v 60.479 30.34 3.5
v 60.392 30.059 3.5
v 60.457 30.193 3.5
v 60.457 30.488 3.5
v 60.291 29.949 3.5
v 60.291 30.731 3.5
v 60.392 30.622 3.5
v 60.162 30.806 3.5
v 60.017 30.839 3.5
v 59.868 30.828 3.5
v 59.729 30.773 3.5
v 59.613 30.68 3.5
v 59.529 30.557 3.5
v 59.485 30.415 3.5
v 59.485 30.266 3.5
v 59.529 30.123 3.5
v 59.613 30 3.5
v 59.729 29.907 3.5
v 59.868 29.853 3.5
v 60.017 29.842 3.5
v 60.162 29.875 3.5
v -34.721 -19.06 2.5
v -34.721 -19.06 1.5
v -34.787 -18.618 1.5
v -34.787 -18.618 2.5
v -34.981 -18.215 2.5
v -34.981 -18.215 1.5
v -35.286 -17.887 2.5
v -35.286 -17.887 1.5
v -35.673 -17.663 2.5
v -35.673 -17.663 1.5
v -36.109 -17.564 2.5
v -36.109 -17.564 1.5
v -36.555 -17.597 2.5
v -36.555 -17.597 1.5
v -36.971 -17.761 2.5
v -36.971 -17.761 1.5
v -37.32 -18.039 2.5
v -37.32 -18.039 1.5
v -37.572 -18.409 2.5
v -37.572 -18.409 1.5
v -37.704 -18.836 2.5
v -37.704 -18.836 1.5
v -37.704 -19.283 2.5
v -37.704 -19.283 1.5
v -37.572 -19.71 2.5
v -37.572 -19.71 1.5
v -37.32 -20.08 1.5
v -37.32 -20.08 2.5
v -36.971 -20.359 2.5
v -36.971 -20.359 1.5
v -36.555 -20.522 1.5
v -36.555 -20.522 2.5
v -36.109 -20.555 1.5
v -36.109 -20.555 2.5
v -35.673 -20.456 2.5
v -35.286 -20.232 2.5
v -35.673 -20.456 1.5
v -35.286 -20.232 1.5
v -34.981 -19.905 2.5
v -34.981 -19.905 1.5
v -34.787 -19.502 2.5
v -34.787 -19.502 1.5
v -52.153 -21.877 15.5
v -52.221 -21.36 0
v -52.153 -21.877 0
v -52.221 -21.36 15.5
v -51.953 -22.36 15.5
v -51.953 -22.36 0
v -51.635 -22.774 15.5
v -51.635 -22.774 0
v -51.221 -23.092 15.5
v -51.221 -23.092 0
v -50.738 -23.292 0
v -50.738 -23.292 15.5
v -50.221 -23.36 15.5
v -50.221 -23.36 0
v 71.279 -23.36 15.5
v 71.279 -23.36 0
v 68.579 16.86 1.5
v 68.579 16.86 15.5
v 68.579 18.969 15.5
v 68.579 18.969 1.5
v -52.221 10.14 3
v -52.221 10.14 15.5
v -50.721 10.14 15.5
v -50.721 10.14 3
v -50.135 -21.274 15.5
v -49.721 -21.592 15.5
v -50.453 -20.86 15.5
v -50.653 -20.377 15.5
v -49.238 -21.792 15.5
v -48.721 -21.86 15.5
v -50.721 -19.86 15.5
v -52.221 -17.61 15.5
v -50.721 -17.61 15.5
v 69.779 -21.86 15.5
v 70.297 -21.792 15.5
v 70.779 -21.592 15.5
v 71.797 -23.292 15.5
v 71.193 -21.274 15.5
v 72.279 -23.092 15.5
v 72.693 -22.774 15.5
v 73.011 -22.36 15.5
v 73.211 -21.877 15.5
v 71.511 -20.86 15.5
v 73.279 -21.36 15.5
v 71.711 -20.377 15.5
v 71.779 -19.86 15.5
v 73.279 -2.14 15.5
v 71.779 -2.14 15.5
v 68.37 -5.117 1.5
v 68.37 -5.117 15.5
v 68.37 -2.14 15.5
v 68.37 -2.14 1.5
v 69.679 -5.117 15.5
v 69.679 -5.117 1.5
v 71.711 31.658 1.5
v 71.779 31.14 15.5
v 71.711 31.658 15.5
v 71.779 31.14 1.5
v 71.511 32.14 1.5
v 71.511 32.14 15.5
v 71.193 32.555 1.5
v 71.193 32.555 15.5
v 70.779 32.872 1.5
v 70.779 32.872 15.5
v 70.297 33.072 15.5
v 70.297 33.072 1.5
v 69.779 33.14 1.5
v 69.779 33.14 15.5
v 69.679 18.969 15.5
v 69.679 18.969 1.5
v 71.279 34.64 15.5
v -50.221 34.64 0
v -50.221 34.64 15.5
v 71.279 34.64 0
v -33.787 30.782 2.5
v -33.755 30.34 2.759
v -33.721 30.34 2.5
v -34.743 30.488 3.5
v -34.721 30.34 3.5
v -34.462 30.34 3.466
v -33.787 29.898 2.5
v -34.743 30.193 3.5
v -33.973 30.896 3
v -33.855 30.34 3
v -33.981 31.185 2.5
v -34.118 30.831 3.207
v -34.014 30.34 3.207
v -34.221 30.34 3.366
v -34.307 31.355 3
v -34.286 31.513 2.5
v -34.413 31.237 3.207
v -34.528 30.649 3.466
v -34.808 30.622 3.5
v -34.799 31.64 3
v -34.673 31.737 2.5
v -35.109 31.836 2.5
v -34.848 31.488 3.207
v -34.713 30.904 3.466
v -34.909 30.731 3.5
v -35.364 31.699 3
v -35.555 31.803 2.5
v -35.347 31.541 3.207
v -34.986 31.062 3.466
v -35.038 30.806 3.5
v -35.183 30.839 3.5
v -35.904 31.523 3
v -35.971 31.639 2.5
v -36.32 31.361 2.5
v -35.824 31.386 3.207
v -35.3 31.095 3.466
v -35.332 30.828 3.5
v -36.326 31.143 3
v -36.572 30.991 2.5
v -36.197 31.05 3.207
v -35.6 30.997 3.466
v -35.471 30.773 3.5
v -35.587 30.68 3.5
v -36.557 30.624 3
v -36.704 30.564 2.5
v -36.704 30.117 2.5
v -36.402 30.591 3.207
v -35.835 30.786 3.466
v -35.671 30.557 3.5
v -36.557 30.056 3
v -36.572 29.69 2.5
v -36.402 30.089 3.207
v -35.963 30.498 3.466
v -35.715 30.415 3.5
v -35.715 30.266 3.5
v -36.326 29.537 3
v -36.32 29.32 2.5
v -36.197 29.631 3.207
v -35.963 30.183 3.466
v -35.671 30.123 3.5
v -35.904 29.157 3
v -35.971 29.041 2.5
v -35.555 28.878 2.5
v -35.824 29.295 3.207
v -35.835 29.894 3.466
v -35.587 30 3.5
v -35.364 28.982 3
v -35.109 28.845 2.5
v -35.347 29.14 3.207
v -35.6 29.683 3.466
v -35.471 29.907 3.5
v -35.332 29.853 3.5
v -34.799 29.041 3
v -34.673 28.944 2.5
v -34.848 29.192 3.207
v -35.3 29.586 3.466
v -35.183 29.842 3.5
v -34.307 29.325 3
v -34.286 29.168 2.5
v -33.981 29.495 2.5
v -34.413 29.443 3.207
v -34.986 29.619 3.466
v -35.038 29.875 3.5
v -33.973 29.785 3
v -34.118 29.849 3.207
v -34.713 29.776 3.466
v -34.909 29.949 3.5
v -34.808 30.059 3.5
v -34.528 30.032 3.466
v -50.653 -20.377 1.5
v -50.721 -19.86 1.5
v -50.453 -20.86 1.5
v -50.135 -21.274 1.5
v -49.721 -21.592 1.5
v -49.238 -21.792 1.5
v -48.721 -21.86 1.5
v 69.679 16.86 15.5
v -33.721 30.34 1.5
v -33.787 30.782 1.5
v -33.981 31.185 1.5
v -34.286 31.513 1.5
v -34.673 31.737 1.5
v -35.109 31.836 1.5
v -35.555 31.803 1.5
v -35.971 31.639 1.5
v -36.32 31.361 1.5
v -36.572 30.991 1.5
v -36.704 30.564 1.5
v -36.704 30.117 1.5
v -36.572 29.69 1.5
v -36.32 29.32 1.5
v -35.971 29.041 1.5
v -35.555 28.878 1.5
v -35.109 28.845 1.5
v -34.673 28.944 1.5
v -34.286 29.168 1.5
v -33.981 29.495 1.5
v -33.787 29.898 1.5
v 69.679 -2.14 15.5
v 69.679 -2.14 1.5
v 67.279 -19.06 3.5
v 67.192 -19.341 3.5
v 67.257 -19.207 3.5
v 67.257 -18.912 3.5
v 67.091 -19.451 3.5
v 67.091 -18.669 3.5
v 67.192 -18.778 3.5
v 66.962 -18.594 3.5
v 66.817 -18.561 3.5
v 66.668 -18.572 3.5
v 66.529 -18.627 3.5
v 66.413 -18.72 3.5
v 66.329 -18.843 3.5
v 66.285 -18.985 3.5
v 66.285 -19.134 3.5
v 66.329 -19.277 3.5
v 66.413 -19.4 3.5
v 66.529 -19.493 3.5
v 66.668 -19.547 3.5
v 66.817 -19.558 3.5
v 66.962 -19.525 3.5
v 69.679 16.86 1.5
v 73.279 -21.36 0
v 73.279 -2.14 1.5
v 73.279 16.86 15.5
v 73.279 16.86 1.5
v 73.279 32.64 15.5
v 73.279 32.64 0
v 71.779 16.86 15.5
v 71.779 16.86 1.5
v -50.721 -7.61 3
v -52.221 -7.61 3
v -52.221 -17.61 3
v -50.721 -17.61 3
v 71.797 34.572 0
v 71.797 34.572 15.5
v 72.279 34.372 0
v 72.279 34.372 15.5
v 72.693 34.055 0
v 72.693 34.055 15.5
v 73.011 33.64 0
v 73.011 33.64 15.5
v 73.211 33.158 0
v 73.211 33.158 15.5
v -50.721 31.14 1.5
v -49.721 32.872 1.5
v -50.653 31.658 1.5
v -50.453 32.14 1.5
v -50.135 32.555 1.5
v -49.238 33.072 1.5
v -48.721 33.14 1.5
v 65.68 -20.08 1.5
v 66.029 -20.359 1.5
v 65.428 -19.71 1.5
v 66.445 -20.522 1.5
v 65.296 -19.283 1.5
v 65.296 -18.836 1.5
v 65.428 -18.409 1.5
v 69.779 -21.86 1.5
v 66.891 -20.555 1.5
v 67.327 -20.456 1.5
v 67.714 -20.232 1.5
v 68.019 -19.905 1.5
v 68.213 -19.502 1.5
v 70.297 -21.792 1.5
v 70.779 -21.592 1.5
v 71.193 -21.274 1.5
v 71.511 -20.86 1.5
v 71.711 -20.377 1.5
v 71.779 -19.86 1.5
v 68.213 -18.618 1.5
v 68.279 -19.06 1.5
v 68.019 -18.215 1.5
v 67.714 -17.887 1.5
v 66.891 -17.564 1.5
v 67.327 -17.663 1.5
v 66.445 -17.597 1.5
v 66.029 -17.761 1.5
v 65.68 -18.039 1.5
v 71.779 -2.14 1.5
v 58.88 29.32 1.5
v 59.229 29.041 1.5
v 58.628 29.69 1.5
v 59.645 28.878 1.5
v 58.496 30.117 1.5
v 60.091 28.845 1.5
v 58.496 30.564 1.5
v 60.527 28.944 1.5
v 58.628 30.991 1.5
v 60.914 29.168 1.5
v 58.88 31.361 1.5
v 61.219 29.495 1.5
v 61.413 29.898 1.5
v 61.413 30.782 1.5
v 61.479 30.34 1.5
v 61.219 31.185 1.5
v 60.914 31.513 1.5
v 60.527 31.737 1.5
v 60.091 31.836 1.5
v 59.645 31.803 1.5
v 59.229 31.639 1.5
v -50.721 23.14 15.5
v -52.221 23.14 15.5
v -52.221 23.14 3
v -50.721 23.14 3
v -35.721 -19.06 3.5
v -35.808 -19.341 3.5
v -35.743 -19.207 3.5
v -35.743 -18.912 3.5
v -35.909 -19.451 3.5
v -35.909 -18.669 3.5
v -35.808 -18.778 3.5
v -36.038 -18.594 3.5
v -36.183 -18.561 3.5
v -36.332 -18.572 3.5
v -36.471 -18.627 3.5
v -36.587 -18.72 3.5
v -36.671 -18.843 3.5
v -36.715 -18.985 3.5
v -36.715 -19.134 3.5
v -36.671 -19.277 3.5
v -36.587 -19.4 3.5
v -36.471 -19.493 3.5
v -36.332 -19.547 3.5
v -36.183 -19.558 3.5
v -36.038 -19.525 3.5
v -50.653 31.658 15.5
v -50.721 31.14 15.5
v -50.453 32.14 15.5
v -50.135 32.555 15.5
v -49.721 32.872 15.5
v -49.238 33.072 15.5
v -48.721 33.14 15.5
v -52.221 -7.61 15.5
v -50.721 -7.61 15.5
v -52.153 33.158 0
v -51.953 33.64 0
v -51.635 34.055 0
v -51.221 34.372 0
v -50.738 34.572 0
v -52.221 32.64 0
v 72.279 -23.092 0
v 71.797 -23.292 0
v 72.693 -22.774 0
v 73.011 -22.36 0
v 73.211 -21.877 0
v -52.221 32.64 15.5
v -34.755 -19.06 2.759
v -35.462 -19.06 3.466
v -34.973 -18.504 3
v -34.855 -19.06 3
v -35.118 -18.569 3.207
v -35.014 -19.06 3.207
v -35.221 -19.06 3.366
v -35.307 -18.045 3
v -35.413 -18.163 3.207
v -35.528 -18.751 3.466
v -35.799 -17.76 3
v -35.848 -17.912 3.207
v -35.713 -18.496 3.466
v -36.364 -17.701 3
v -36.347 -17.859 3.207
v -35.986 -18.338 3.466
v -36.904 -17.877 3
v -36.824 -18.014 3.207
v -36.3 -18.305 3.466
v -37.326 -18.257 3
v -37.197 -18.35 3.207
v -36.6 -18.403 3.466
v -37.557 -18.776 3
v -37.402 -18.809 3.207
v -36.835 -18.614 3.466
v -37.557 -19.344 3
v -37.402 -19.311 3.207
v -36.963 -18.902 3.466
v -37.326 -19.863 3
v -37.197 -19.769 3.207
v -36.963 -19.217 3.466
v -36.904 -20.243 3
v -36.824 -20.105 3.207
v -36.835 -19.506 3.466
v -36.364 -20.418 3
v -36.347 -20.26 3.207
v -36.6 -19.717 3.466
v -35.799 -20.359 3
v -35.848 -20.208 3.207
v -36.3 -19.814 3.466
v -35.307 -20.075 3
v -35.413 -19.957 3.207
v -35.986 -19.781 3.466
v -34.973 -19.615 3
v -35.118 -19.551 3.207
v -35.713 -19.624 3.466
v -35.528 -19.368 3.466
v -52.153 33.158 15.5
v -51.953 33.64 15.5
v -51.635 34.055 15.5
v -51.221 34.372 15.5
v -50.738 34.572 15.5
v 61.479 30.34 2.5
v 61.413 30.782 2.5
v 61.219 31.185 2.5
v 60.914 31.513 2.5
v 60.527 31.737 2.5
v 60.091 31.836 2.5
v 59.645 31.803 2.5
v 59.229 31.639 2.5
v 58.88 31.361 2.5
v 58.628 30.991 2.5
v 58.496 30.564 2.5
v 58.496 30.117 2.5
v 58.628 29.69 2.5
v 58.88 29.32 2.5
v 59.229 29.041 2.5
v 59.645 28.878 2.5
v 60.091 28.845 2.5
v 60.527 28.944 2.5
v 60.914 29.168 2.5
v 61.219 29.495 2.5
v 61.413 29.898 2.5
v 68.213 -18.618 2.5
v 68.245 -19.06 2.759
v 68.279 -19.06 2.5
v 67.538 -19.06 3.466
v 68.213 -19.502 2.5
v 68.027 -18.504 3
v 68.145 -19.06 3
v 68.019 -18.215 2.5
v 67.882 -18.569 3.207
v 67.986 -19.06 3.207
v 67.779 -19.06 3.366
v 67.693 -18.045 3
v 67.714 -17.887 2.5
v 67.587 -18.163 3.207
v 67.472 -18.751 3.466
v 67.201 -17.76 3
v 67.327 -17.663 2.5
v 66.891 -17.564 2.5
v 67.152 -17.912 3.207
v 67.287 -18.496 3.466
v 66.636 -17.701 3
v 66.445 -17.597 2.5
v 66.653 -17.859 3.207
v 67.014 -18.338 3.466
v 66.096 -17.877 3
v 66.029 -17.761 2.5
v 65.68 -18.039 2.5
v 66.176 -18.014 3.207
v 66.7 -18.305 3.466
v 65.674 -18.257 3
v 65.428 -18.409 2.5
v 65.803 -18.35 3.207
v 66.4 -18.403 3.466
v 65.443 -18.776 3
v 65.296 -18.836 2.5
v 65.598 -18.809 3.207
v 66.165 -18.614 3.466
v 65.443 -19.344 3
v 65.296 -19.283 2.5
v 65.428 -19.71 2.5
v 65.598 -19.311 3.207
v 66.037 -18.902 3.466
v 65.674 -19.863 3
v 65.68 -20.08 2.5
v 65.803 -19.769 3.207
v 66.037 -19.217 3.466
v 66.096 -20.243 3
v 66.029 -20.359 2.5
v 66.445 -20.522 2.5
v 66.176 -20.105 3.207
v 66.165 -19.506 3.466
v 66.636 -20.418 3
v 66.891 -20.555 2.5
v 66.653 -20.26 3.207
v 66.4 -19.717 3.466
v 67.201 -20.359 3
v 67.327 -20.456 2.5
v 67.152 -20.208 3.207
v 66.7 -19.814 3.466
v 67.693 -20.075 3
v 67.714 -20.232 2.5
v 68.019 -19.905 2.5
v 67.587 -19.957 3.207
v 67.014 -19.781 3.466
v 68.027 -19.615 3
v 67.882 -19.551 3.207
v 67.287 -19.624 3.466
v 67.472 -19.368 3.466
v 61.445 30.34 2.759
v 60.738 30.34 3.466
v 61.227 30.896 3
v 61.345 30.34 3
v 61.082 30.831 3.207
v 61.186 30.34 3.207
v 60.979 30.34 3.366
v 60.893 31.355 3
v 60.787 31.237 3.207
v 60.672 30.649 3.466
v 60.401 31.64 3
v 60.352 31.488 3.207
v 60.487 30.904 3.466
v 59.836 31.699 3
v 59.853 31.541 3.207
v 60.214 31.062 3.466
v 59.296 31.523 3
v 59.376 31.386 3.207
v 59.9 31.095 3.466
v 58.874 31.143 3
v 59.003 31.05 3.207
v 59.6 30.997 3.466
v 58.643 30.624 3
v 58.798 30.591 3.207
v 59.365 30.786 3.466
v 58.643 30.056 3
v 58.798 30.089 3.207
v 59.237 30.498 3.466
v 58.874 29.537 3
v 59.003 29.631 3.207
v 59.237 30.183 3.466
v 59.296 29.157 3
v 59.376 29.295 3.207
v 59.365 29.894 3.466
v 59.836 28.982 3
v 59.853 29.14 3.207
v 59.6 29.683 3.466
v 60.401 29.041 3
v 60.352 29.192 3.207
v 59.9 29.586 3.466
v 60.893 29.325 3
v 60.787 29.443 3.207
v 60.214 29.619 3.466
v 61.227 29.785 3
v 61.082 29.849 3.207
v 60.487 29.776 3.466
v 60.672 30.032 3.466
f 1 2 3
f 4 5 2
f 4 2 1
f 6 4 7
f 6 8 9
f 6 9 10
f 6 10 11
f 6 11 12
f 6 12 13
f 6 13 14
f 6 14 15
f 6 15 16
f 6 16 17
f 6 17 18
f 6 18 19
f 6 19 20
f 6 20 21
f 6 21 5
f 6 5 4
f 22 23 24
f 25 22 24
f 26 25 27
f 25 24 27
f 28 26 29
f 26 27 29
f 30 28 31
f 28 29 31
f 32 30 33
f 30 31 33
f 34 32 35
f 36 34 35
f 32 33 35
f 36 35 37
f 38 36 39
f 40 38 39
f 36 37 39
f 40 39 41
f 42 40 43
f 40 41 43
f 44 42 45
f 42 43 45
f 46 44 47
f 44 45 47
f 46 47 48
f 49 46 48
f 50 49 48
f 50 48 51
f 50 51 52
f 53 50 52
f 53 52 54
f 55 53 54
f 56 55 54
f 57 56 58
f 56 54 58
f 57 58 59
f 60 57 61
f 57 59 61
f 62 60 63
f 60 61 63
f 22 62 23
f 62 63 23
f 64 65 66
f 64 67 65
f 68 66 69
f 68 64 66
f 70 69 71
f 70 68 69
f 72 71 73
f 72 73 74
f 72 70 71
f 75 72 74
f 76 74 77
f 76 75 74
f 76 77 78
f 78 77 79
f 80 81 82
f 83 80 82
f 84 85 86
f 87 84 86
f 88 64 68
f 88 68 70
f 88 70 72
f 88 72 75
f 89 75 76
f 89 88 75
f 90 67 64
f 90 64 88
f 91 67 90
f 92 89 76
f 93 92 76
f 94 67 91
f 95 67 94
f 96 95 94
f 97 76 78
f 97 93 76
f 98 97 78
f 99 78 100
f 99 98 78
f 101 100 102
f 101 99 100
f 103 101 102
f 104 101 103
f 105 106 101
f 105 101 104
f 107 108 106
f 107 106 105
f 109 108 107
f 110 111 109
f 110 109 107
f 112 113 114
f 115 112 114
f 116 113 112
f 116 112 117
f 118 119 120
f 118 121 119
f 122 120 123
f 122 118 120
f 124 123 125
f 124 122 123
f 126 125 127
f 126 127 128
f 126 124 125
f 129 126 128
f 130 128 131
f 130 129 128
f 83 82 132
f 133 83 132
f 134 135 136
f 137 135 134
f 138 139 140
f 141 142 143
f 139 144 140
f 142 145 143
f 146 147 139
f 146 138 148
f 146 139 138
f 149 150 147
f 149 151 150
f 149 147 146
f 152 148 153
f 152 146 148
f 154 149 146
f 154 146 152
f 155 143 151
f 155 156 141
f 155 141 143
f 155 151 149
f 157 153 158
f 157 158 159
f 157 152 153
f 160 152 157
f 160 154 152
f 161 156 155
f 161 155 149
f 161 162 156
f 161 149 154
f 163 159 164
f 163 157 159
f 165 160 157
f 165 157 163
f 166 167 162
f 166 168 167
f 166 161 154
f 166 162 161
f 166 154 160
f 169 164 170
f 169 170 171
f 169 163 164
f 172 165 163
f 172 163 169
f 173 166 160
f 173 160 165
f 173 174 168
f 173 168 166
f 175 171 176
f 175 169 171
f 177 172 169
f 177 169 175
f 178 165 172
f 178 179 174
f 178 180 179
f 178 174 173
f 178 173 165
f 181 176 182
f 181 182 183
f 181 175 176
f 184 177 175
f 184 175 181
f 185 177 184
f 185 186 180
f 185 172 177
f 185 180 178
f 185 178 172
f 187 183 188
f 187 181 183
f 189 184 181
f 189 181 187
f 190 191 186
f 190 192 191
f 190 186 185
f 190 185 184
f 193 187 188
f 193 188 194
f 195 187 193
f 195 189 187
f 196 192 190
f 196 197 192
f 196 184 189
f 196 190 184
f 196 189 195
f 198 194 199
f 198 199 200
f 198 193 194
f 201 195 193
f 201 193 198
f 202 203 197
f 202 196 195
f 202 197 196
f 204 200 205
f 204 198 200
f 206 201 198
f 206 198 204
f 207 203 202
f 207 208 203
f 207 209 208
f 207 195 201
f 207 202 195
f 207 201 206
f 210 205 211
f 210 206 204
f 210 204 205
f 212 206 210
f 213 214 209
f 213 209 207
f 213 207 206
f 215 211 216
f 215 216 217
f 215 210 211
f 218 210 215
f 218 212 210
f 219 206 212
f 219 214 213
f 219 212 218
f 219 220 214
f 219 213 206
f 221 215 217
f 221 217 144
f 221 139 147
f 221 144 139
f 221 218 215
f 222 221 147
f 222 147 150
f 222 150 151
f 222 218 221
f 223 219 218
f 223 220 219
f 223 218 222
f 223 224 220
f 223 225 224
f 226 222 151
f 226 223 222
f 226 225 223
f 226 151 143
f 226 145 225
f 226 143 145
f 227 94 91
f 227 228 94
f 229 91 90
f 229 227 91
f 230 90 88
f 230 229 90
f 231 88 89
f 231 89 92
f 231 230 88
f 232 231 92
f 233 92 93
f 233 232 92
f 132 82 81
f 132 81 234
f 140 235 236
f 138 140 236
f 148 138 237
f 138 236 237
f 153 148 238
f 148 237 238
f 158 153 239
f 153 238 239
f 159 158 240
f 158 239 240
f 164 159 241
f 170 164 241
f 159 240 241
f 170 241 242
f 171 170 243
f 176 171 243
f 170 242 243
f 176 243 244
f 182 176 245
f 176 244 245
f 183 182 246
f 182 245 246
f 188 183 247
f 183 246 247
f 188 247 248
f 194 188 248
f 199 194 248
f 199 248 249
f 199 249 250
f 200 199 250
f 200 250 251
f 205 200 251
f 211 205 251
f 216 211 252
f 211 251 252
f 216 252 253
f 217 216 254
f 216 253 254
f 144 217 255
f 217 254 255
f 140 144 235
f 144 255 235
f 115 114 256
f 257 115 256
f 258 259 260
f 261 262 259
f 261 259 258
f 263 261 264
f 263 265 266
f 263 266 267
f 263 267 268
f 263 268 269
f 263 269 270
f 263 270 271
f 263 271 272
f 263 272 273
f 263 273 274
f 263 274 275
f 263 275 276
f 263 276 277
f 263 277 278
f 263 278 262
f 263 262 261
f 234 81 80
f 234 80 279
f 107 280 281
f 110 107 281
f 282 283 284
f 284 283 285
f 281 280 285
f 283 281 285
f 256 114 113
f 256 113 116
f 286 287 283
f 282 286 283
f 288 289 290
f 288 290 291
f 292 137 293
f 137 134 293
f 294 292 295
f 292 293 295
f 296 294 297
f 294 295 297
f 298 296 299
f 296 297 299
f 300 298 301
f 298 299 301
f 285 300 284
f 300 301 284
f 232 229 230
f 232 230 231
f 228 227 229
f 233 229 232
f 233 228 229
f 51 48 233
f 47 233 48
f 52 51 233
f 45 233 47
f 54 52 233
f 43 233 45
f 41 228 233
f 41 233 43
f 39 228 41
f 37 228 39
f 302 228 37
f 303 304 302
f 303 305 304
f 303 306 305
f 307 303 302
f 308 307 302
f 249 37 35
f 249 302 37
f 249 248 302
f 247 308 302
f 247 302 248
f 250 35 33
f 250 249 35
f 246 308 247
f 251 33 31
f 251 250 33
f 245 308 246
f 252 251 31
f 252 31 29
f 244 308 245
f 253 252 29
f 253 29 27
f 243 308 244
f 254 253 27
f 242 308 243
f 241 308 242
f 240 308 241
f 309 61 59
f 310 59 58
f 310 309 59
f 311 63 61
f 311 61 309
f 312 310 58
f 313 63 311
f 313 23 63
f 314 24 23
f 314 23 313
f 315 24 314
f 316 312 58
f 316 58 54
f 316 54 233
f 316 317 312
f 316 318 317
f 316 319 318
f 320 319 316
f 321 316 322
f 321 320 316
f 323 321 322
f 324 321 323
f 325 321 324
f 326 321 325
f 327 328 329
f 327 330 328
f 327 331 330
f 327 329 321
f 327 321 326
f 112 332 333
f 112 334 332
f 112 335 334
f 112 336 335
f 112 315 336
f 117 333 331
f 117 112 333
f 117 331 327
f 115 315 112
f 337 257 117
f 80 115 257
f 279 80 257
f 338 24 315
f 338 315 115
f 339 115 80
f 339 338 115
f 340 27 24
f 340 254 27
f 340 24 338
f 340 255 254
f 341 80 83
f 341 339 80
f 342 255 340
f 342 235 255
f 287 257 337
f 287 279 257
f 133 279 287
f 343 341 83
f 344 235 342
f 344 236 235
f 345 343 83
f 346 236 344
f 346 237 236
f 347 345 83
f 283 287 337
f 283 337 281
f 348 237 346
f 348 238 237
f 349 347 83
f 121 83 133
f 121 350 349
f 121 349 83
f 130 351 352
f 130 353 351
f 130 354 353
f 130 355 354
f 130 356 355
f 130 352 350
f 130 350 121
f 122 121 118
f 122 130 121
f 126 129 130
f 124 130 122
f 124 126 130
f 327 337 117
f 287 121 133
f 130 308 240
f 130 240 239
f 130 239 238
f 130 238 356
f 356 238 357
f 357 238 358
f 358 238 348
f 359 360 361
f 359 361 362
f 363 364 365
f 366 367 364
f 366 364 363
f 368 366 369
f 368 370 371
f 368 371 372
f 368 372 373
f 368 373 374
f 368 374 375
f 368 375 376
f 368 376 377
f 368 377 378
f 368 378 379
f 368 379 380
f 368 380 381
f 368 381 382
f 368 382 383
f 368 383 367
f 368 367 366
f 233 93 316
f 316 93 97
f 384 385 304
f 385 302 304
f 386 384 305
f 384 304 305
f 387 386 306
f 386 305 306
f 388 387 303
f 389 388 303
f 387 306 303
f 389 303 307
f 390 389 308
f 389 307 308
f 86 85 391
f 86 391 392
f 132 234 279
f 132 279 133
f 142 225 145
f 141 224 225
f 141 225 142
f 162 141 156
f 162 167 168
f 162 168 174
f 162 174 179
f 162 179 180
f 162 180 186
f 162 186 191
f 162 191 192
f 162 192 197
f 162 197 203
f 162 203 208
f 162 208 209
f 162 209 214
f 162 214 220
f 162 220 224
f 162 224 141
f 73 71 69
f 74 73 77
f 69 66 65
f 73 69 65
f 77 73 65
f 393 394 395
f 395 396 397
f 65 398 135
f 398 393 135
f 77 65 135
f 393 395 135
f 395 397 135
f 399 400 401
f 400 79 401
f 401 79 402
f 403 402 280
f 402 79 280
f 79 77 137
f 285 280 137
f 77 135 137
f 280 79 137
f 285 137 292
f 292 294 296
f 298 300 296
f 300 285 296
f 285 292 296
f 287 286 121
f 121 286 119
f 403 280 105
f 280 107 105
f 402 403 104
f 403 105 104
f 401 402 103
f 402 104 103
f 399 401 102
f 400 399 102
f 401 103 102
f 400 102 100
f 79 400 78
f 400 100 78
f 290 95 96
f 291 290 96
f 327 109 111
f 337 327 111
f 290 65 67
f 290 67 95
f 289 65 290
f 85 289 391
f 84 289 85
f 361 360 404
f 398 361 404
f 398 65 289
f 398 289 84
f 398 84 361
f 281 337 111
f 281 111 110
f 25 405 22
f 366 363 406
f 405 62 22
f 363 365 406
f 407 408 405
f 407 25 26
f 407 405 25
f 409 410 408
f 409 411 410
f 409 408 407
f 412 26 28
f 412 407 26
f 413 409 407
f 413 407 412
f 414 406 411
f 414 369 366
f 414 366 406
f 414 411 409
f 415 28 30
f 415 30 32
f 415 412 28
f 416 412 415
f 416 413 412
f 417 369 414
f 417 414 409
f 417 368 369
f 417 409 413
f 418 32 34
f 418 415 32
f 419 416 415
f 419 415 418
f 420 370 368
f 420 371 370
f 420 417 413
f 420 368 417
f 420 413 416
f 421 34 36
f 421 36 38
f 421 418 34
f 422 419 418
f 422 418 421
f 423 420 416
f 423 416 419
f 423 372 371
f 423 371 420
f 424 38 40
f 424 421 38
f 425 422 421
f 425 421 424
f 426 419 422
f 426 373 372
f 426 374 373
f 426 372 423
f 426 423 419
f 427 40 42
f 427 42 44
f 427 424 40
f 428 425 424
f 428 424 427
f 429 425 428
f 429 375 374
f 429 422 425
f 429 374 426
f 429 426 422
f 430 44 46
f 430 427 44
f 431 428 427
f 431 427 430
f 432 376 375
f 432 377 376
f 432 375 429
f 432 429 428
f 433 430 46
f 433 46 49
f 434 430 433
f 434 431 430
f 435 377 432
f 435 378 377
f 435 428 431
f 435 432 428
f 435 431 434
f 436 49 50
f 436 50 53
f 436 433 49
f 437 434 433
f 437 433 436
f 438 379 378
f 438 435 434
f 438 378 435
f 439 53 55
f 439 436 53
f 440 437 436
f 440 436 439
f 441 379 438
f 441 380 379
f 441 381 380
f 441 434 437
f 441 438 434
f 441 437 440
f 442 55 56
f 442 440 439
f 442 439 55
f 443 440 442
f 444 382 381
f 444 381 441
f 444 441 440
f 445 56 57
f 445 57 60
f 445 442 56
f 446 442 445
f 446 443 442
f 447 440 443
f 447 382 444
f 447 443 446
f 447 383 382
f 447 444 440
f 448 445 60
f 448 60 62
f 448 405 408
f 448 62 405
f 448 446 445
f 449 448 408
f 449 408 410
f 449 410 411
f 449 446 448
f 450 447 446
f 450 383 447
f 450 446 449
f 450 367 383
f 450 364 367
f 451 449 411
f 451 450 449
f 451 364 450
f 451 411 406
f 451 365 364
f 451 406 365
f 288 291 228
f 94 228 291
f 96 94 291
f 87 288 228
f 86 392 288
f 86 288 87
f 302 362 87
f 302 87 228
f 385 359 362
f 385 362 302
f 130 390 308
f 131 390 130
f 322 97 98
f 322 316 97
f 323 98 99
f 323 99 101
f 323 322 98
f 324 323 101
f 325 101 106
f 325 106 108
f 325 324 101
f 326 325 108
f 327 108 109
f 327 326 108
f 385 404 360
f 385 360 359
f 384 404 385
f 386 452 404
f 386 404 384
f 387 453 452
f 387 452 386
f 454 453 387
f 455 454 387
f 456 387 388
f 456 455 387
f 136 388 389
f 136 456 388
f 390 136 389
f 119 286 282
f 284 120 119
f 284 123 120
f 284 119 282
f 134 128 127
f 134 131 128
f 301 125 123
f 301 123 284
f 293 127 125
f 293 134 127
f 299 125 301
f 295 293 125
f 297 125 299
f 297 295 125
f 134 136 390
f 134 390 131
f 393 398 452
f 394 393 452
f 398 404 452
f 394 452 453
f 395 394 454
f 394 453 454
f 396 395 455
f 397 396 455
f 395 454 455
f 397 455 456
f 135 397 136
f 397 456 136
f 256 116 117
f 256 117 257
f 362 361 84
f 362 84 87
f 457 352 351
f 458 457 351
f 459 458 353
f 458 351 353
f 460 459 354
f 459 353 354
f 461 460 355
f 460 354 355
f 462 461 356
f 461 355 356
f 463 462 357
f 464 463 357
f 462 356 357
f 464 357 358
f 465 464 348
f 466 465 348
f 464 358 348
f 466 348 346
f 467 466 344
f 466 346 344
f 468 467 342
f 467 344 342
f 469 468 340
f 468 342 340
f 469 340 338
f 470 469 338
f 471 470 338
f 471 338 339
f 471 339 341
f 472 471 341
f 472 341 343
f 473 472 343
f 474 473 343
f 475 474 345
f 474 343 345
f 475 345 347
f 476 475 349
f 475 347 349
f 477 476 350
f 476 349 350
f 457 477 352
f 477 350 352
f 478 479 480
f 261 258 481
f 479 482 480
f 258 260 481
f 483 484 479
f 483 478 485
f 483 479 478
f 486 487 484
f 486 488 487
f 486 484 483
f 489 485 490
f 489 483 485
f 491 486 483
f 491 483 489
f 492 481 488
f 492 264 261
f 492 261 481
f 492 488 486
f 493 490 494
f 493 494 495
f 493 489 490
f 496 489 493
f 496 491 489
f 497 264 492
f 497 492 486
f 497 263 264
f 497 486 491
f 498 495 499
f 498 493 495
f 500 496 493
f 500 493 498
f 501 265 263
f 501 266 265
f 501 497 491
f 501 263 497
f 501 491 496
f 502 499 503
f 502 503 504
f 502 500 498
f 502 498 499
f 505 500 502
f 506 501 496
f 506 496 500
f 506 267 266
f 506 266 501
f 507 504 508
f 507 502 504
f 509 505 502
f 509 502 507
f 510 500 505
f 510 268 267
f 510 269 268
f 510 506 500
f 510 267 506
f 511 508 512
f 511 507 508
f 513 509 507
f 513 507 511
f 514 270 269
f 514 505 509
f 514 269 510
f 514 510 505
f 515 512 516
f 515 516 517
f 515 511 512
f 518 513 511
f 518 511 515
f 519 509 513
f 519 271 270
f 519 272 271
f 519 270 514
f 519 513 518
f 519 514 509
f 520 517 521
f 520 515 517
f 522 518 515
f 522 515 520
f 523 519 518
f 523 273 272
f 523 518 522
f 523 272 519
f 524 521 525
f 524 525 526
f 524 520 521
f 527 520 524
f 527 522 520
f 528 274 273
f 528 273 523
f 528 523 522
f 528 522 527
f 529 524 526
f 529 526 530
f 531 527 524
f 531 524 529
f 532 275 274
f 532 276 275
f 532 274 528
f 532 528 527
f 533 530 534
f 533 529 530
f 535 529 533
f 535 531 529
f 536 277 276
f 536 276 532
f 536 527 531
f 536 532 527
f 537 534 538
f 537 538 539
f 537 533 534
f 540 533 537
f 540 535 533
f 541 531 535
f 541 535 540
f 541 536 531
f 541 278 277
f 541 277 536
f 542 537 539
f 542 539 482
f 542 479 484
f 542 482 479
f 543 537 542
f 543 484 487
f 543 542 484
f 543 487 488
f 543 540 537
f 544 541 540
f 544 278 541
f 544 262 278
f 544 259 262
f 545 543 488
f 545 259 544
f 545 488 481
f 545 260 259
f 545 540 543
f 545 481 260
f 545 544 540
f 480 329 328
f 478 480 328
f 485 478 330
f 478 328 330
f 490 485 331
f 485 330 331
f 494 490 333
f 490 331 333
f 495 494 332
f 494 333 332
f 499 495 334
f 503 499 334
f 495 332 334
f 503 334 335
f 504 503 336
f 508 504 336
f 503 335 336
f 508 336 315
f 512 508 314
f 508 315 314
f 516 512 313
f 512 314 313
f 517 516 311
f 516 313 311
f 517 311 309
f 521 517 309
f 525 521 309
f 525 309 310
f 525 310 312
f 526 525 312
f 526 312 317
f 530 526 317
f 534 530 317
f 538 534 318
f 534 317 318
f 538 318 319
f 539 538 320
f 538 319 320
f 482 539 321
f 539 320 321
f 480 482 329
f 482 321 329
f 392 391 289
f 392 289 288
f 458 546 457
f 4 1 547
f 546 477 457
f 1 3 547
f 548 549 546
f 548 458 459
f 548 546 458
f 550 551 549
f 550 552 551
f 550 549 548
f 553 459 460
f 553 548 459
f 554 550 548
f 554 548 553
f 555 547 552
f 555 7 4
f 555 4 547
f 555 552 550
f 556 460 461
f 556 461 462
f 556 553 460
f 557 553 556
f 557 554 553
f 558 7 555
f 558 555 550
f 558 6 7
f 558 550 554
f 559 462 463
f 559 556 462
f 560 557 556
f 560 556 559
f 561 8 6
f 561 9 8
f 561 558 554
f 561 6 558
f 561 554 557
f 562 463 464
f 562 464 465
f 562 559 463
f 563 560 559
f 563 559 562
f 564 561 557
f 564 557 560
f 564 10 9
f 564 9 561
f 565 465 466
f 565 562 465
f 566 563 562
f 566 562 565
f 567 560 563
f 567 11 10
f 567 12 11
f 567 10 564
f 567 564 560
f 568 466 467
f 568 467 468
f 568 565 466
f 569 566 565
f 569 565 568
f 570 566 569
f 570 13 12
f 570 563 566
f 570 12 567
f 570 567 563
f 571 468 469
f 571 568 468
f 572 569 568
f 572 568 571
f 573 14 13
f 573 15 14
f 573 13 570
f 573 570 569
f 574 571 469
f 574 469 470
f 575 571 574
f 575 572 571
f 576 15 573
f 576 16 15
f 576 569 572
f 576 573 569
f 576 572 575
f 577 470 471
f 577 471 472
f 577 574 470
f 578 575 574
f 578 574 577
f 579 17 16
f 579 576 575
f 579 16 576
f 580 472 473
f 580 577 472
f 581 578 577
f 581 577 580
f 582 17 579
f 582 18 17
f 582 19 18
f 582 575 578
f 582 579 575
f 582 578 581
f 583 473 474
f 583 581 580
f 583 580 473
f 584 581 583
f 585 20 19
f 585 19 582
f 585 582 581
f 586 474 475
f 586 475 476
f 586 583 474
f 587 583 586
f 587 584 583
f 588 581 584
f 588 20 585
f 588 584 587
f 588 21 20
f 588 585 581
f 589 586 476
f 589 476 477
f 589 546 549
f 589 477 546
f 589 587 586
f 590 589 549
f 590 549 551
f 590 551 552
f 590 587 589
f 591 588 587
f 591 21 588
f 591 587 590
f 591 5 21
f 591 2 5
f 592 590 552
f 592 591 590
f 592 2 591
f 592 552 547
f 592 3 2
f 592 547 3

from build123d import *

# Parameters (mm, degrees)
F0_W      = 125.5
F0_H      = 58
F1_DEPTH  = 15.5
F2_W      = 122.5
F2_H      = 55
F3_DEPTH  = 14
F4_W      = 1.5
F4_H      = 13
F4_H_2    = 10
F5_DEPTH  = 12.5
F6_R      = 1.5
F7_DEPTH  = 2
F8_R      = 1
F9_R      = 2
F10_R     = 2
F11_W     = 1.5
F11_H     = 19
F12_DEPTH = 14
F13_W     = 1.1
F13_H     = 2.109523
F13_W_2   = 1.309524
F13_H_2   = 2.976188
F14_DEPTH = 14


with BuildPart() as f1:
    # F0 (on Top) → F1 (new body)
    with BuildSketch(Plane.XY):
        with Locations((10.529152, 5.640338)):
            Rectangle(F0_W, F0_H)
    extrude(amount=F1_DEPTH)

    # F2 (on face) → F3 (cut)
    with BuildSketch(Plane.XY.offset(15.5)):
        with Locations((10.529152, 5.640338)):
            Rectangle(F2_W, F2_H)
    extrude(amount=-F3_DEPTH, mode=Mode.SUBTRACT)

    # F4 (on face) → F5 (cut)
    with BuildSketch(Plane.XY.offset(15.5)):
        with Locations((-51.470848, 16.640338)):
            Rectangle(F4_W, F4_H)
        with Locations((-51.470848, -12.609662)):
            Rectangle(F4_W, F4_H_2)
    extrude(amount=-F5_DEPTH, mode=Mode.SUBTRACT)

    # F6 (on face) → F7 (join)
    with BuildSketch(Plane.XY.offset(1.5)):
        with Locations((-35.220848, 30.340338)):
            Circle(F6_R)
        with Locations((59.979152, 30.340338)):
            Circle(F6_R)
        with Locations((66.779152, -19.059662)):
            Circle(F6_R)
        with Locations((-36.220848, -19.059662)):
            Circle(F6_R)
    extrude(amount=F7_DEPTH)

    # F8
    f8_edges = [f1.edges().sort_by_distance(p)[0] for p in [
        (-36.720848, 30.340338, 3.5),
        (58.479152, 30.340338, 3.5),
        (-37.720848, -19.059662, 3.5),
        (65.279152, -19.059662, 3.5),
    ]]
    fillet(f8_edges, radius=F8_R)

    # F9
    f9_edges = [f1.edges().sort_by_distance(p)[0] for p in [
        (-52.220848, 34.640338, 7.75),
        (-52.220848, -23.359662, 7.75),
        (73.279152, -23.359662, 7.75),
        (73.279152, 34.640338, 7.75),
    ]]
    fillet(f9_edges, radius=F9_R)

    # F10
    f10_edges = [f1.edges().sort_by_distance(p)[0] for p in [
        (-50.720848, 33.140338, 8.5),
        (71.779152, -21.859662, 8.5),
        (71.779152, 33.140338, 8.5),
        (-50.720848, -21.859662, 8.5),
    ]]
    fillet(f10_edges, radius=F10_R)

    # F11 (on face) → F12 (cut)
    with BuildSketch(Plane.XY.offset(15.5)):
        with Locations((72.529152, 7.359652)):
            Rectangle(F11_W, F11_H)
    extrude(amount=-F12_DEPTH, mode=Mode.SUBTRACT)

    # F13 (on face) → F14 (join)
    with BuildSketch(Plane.XY.offset(15.5)):
        with Locations((69.129152, 17.914414)):
            Rectangle(F13_W, F13_H)
        with Locations((69.02439, -3.628442)):
            Rectangle(F13_W_2, F13_H_2)
    extrude(amount=-F14_DEPTH)


solid = f1.part
